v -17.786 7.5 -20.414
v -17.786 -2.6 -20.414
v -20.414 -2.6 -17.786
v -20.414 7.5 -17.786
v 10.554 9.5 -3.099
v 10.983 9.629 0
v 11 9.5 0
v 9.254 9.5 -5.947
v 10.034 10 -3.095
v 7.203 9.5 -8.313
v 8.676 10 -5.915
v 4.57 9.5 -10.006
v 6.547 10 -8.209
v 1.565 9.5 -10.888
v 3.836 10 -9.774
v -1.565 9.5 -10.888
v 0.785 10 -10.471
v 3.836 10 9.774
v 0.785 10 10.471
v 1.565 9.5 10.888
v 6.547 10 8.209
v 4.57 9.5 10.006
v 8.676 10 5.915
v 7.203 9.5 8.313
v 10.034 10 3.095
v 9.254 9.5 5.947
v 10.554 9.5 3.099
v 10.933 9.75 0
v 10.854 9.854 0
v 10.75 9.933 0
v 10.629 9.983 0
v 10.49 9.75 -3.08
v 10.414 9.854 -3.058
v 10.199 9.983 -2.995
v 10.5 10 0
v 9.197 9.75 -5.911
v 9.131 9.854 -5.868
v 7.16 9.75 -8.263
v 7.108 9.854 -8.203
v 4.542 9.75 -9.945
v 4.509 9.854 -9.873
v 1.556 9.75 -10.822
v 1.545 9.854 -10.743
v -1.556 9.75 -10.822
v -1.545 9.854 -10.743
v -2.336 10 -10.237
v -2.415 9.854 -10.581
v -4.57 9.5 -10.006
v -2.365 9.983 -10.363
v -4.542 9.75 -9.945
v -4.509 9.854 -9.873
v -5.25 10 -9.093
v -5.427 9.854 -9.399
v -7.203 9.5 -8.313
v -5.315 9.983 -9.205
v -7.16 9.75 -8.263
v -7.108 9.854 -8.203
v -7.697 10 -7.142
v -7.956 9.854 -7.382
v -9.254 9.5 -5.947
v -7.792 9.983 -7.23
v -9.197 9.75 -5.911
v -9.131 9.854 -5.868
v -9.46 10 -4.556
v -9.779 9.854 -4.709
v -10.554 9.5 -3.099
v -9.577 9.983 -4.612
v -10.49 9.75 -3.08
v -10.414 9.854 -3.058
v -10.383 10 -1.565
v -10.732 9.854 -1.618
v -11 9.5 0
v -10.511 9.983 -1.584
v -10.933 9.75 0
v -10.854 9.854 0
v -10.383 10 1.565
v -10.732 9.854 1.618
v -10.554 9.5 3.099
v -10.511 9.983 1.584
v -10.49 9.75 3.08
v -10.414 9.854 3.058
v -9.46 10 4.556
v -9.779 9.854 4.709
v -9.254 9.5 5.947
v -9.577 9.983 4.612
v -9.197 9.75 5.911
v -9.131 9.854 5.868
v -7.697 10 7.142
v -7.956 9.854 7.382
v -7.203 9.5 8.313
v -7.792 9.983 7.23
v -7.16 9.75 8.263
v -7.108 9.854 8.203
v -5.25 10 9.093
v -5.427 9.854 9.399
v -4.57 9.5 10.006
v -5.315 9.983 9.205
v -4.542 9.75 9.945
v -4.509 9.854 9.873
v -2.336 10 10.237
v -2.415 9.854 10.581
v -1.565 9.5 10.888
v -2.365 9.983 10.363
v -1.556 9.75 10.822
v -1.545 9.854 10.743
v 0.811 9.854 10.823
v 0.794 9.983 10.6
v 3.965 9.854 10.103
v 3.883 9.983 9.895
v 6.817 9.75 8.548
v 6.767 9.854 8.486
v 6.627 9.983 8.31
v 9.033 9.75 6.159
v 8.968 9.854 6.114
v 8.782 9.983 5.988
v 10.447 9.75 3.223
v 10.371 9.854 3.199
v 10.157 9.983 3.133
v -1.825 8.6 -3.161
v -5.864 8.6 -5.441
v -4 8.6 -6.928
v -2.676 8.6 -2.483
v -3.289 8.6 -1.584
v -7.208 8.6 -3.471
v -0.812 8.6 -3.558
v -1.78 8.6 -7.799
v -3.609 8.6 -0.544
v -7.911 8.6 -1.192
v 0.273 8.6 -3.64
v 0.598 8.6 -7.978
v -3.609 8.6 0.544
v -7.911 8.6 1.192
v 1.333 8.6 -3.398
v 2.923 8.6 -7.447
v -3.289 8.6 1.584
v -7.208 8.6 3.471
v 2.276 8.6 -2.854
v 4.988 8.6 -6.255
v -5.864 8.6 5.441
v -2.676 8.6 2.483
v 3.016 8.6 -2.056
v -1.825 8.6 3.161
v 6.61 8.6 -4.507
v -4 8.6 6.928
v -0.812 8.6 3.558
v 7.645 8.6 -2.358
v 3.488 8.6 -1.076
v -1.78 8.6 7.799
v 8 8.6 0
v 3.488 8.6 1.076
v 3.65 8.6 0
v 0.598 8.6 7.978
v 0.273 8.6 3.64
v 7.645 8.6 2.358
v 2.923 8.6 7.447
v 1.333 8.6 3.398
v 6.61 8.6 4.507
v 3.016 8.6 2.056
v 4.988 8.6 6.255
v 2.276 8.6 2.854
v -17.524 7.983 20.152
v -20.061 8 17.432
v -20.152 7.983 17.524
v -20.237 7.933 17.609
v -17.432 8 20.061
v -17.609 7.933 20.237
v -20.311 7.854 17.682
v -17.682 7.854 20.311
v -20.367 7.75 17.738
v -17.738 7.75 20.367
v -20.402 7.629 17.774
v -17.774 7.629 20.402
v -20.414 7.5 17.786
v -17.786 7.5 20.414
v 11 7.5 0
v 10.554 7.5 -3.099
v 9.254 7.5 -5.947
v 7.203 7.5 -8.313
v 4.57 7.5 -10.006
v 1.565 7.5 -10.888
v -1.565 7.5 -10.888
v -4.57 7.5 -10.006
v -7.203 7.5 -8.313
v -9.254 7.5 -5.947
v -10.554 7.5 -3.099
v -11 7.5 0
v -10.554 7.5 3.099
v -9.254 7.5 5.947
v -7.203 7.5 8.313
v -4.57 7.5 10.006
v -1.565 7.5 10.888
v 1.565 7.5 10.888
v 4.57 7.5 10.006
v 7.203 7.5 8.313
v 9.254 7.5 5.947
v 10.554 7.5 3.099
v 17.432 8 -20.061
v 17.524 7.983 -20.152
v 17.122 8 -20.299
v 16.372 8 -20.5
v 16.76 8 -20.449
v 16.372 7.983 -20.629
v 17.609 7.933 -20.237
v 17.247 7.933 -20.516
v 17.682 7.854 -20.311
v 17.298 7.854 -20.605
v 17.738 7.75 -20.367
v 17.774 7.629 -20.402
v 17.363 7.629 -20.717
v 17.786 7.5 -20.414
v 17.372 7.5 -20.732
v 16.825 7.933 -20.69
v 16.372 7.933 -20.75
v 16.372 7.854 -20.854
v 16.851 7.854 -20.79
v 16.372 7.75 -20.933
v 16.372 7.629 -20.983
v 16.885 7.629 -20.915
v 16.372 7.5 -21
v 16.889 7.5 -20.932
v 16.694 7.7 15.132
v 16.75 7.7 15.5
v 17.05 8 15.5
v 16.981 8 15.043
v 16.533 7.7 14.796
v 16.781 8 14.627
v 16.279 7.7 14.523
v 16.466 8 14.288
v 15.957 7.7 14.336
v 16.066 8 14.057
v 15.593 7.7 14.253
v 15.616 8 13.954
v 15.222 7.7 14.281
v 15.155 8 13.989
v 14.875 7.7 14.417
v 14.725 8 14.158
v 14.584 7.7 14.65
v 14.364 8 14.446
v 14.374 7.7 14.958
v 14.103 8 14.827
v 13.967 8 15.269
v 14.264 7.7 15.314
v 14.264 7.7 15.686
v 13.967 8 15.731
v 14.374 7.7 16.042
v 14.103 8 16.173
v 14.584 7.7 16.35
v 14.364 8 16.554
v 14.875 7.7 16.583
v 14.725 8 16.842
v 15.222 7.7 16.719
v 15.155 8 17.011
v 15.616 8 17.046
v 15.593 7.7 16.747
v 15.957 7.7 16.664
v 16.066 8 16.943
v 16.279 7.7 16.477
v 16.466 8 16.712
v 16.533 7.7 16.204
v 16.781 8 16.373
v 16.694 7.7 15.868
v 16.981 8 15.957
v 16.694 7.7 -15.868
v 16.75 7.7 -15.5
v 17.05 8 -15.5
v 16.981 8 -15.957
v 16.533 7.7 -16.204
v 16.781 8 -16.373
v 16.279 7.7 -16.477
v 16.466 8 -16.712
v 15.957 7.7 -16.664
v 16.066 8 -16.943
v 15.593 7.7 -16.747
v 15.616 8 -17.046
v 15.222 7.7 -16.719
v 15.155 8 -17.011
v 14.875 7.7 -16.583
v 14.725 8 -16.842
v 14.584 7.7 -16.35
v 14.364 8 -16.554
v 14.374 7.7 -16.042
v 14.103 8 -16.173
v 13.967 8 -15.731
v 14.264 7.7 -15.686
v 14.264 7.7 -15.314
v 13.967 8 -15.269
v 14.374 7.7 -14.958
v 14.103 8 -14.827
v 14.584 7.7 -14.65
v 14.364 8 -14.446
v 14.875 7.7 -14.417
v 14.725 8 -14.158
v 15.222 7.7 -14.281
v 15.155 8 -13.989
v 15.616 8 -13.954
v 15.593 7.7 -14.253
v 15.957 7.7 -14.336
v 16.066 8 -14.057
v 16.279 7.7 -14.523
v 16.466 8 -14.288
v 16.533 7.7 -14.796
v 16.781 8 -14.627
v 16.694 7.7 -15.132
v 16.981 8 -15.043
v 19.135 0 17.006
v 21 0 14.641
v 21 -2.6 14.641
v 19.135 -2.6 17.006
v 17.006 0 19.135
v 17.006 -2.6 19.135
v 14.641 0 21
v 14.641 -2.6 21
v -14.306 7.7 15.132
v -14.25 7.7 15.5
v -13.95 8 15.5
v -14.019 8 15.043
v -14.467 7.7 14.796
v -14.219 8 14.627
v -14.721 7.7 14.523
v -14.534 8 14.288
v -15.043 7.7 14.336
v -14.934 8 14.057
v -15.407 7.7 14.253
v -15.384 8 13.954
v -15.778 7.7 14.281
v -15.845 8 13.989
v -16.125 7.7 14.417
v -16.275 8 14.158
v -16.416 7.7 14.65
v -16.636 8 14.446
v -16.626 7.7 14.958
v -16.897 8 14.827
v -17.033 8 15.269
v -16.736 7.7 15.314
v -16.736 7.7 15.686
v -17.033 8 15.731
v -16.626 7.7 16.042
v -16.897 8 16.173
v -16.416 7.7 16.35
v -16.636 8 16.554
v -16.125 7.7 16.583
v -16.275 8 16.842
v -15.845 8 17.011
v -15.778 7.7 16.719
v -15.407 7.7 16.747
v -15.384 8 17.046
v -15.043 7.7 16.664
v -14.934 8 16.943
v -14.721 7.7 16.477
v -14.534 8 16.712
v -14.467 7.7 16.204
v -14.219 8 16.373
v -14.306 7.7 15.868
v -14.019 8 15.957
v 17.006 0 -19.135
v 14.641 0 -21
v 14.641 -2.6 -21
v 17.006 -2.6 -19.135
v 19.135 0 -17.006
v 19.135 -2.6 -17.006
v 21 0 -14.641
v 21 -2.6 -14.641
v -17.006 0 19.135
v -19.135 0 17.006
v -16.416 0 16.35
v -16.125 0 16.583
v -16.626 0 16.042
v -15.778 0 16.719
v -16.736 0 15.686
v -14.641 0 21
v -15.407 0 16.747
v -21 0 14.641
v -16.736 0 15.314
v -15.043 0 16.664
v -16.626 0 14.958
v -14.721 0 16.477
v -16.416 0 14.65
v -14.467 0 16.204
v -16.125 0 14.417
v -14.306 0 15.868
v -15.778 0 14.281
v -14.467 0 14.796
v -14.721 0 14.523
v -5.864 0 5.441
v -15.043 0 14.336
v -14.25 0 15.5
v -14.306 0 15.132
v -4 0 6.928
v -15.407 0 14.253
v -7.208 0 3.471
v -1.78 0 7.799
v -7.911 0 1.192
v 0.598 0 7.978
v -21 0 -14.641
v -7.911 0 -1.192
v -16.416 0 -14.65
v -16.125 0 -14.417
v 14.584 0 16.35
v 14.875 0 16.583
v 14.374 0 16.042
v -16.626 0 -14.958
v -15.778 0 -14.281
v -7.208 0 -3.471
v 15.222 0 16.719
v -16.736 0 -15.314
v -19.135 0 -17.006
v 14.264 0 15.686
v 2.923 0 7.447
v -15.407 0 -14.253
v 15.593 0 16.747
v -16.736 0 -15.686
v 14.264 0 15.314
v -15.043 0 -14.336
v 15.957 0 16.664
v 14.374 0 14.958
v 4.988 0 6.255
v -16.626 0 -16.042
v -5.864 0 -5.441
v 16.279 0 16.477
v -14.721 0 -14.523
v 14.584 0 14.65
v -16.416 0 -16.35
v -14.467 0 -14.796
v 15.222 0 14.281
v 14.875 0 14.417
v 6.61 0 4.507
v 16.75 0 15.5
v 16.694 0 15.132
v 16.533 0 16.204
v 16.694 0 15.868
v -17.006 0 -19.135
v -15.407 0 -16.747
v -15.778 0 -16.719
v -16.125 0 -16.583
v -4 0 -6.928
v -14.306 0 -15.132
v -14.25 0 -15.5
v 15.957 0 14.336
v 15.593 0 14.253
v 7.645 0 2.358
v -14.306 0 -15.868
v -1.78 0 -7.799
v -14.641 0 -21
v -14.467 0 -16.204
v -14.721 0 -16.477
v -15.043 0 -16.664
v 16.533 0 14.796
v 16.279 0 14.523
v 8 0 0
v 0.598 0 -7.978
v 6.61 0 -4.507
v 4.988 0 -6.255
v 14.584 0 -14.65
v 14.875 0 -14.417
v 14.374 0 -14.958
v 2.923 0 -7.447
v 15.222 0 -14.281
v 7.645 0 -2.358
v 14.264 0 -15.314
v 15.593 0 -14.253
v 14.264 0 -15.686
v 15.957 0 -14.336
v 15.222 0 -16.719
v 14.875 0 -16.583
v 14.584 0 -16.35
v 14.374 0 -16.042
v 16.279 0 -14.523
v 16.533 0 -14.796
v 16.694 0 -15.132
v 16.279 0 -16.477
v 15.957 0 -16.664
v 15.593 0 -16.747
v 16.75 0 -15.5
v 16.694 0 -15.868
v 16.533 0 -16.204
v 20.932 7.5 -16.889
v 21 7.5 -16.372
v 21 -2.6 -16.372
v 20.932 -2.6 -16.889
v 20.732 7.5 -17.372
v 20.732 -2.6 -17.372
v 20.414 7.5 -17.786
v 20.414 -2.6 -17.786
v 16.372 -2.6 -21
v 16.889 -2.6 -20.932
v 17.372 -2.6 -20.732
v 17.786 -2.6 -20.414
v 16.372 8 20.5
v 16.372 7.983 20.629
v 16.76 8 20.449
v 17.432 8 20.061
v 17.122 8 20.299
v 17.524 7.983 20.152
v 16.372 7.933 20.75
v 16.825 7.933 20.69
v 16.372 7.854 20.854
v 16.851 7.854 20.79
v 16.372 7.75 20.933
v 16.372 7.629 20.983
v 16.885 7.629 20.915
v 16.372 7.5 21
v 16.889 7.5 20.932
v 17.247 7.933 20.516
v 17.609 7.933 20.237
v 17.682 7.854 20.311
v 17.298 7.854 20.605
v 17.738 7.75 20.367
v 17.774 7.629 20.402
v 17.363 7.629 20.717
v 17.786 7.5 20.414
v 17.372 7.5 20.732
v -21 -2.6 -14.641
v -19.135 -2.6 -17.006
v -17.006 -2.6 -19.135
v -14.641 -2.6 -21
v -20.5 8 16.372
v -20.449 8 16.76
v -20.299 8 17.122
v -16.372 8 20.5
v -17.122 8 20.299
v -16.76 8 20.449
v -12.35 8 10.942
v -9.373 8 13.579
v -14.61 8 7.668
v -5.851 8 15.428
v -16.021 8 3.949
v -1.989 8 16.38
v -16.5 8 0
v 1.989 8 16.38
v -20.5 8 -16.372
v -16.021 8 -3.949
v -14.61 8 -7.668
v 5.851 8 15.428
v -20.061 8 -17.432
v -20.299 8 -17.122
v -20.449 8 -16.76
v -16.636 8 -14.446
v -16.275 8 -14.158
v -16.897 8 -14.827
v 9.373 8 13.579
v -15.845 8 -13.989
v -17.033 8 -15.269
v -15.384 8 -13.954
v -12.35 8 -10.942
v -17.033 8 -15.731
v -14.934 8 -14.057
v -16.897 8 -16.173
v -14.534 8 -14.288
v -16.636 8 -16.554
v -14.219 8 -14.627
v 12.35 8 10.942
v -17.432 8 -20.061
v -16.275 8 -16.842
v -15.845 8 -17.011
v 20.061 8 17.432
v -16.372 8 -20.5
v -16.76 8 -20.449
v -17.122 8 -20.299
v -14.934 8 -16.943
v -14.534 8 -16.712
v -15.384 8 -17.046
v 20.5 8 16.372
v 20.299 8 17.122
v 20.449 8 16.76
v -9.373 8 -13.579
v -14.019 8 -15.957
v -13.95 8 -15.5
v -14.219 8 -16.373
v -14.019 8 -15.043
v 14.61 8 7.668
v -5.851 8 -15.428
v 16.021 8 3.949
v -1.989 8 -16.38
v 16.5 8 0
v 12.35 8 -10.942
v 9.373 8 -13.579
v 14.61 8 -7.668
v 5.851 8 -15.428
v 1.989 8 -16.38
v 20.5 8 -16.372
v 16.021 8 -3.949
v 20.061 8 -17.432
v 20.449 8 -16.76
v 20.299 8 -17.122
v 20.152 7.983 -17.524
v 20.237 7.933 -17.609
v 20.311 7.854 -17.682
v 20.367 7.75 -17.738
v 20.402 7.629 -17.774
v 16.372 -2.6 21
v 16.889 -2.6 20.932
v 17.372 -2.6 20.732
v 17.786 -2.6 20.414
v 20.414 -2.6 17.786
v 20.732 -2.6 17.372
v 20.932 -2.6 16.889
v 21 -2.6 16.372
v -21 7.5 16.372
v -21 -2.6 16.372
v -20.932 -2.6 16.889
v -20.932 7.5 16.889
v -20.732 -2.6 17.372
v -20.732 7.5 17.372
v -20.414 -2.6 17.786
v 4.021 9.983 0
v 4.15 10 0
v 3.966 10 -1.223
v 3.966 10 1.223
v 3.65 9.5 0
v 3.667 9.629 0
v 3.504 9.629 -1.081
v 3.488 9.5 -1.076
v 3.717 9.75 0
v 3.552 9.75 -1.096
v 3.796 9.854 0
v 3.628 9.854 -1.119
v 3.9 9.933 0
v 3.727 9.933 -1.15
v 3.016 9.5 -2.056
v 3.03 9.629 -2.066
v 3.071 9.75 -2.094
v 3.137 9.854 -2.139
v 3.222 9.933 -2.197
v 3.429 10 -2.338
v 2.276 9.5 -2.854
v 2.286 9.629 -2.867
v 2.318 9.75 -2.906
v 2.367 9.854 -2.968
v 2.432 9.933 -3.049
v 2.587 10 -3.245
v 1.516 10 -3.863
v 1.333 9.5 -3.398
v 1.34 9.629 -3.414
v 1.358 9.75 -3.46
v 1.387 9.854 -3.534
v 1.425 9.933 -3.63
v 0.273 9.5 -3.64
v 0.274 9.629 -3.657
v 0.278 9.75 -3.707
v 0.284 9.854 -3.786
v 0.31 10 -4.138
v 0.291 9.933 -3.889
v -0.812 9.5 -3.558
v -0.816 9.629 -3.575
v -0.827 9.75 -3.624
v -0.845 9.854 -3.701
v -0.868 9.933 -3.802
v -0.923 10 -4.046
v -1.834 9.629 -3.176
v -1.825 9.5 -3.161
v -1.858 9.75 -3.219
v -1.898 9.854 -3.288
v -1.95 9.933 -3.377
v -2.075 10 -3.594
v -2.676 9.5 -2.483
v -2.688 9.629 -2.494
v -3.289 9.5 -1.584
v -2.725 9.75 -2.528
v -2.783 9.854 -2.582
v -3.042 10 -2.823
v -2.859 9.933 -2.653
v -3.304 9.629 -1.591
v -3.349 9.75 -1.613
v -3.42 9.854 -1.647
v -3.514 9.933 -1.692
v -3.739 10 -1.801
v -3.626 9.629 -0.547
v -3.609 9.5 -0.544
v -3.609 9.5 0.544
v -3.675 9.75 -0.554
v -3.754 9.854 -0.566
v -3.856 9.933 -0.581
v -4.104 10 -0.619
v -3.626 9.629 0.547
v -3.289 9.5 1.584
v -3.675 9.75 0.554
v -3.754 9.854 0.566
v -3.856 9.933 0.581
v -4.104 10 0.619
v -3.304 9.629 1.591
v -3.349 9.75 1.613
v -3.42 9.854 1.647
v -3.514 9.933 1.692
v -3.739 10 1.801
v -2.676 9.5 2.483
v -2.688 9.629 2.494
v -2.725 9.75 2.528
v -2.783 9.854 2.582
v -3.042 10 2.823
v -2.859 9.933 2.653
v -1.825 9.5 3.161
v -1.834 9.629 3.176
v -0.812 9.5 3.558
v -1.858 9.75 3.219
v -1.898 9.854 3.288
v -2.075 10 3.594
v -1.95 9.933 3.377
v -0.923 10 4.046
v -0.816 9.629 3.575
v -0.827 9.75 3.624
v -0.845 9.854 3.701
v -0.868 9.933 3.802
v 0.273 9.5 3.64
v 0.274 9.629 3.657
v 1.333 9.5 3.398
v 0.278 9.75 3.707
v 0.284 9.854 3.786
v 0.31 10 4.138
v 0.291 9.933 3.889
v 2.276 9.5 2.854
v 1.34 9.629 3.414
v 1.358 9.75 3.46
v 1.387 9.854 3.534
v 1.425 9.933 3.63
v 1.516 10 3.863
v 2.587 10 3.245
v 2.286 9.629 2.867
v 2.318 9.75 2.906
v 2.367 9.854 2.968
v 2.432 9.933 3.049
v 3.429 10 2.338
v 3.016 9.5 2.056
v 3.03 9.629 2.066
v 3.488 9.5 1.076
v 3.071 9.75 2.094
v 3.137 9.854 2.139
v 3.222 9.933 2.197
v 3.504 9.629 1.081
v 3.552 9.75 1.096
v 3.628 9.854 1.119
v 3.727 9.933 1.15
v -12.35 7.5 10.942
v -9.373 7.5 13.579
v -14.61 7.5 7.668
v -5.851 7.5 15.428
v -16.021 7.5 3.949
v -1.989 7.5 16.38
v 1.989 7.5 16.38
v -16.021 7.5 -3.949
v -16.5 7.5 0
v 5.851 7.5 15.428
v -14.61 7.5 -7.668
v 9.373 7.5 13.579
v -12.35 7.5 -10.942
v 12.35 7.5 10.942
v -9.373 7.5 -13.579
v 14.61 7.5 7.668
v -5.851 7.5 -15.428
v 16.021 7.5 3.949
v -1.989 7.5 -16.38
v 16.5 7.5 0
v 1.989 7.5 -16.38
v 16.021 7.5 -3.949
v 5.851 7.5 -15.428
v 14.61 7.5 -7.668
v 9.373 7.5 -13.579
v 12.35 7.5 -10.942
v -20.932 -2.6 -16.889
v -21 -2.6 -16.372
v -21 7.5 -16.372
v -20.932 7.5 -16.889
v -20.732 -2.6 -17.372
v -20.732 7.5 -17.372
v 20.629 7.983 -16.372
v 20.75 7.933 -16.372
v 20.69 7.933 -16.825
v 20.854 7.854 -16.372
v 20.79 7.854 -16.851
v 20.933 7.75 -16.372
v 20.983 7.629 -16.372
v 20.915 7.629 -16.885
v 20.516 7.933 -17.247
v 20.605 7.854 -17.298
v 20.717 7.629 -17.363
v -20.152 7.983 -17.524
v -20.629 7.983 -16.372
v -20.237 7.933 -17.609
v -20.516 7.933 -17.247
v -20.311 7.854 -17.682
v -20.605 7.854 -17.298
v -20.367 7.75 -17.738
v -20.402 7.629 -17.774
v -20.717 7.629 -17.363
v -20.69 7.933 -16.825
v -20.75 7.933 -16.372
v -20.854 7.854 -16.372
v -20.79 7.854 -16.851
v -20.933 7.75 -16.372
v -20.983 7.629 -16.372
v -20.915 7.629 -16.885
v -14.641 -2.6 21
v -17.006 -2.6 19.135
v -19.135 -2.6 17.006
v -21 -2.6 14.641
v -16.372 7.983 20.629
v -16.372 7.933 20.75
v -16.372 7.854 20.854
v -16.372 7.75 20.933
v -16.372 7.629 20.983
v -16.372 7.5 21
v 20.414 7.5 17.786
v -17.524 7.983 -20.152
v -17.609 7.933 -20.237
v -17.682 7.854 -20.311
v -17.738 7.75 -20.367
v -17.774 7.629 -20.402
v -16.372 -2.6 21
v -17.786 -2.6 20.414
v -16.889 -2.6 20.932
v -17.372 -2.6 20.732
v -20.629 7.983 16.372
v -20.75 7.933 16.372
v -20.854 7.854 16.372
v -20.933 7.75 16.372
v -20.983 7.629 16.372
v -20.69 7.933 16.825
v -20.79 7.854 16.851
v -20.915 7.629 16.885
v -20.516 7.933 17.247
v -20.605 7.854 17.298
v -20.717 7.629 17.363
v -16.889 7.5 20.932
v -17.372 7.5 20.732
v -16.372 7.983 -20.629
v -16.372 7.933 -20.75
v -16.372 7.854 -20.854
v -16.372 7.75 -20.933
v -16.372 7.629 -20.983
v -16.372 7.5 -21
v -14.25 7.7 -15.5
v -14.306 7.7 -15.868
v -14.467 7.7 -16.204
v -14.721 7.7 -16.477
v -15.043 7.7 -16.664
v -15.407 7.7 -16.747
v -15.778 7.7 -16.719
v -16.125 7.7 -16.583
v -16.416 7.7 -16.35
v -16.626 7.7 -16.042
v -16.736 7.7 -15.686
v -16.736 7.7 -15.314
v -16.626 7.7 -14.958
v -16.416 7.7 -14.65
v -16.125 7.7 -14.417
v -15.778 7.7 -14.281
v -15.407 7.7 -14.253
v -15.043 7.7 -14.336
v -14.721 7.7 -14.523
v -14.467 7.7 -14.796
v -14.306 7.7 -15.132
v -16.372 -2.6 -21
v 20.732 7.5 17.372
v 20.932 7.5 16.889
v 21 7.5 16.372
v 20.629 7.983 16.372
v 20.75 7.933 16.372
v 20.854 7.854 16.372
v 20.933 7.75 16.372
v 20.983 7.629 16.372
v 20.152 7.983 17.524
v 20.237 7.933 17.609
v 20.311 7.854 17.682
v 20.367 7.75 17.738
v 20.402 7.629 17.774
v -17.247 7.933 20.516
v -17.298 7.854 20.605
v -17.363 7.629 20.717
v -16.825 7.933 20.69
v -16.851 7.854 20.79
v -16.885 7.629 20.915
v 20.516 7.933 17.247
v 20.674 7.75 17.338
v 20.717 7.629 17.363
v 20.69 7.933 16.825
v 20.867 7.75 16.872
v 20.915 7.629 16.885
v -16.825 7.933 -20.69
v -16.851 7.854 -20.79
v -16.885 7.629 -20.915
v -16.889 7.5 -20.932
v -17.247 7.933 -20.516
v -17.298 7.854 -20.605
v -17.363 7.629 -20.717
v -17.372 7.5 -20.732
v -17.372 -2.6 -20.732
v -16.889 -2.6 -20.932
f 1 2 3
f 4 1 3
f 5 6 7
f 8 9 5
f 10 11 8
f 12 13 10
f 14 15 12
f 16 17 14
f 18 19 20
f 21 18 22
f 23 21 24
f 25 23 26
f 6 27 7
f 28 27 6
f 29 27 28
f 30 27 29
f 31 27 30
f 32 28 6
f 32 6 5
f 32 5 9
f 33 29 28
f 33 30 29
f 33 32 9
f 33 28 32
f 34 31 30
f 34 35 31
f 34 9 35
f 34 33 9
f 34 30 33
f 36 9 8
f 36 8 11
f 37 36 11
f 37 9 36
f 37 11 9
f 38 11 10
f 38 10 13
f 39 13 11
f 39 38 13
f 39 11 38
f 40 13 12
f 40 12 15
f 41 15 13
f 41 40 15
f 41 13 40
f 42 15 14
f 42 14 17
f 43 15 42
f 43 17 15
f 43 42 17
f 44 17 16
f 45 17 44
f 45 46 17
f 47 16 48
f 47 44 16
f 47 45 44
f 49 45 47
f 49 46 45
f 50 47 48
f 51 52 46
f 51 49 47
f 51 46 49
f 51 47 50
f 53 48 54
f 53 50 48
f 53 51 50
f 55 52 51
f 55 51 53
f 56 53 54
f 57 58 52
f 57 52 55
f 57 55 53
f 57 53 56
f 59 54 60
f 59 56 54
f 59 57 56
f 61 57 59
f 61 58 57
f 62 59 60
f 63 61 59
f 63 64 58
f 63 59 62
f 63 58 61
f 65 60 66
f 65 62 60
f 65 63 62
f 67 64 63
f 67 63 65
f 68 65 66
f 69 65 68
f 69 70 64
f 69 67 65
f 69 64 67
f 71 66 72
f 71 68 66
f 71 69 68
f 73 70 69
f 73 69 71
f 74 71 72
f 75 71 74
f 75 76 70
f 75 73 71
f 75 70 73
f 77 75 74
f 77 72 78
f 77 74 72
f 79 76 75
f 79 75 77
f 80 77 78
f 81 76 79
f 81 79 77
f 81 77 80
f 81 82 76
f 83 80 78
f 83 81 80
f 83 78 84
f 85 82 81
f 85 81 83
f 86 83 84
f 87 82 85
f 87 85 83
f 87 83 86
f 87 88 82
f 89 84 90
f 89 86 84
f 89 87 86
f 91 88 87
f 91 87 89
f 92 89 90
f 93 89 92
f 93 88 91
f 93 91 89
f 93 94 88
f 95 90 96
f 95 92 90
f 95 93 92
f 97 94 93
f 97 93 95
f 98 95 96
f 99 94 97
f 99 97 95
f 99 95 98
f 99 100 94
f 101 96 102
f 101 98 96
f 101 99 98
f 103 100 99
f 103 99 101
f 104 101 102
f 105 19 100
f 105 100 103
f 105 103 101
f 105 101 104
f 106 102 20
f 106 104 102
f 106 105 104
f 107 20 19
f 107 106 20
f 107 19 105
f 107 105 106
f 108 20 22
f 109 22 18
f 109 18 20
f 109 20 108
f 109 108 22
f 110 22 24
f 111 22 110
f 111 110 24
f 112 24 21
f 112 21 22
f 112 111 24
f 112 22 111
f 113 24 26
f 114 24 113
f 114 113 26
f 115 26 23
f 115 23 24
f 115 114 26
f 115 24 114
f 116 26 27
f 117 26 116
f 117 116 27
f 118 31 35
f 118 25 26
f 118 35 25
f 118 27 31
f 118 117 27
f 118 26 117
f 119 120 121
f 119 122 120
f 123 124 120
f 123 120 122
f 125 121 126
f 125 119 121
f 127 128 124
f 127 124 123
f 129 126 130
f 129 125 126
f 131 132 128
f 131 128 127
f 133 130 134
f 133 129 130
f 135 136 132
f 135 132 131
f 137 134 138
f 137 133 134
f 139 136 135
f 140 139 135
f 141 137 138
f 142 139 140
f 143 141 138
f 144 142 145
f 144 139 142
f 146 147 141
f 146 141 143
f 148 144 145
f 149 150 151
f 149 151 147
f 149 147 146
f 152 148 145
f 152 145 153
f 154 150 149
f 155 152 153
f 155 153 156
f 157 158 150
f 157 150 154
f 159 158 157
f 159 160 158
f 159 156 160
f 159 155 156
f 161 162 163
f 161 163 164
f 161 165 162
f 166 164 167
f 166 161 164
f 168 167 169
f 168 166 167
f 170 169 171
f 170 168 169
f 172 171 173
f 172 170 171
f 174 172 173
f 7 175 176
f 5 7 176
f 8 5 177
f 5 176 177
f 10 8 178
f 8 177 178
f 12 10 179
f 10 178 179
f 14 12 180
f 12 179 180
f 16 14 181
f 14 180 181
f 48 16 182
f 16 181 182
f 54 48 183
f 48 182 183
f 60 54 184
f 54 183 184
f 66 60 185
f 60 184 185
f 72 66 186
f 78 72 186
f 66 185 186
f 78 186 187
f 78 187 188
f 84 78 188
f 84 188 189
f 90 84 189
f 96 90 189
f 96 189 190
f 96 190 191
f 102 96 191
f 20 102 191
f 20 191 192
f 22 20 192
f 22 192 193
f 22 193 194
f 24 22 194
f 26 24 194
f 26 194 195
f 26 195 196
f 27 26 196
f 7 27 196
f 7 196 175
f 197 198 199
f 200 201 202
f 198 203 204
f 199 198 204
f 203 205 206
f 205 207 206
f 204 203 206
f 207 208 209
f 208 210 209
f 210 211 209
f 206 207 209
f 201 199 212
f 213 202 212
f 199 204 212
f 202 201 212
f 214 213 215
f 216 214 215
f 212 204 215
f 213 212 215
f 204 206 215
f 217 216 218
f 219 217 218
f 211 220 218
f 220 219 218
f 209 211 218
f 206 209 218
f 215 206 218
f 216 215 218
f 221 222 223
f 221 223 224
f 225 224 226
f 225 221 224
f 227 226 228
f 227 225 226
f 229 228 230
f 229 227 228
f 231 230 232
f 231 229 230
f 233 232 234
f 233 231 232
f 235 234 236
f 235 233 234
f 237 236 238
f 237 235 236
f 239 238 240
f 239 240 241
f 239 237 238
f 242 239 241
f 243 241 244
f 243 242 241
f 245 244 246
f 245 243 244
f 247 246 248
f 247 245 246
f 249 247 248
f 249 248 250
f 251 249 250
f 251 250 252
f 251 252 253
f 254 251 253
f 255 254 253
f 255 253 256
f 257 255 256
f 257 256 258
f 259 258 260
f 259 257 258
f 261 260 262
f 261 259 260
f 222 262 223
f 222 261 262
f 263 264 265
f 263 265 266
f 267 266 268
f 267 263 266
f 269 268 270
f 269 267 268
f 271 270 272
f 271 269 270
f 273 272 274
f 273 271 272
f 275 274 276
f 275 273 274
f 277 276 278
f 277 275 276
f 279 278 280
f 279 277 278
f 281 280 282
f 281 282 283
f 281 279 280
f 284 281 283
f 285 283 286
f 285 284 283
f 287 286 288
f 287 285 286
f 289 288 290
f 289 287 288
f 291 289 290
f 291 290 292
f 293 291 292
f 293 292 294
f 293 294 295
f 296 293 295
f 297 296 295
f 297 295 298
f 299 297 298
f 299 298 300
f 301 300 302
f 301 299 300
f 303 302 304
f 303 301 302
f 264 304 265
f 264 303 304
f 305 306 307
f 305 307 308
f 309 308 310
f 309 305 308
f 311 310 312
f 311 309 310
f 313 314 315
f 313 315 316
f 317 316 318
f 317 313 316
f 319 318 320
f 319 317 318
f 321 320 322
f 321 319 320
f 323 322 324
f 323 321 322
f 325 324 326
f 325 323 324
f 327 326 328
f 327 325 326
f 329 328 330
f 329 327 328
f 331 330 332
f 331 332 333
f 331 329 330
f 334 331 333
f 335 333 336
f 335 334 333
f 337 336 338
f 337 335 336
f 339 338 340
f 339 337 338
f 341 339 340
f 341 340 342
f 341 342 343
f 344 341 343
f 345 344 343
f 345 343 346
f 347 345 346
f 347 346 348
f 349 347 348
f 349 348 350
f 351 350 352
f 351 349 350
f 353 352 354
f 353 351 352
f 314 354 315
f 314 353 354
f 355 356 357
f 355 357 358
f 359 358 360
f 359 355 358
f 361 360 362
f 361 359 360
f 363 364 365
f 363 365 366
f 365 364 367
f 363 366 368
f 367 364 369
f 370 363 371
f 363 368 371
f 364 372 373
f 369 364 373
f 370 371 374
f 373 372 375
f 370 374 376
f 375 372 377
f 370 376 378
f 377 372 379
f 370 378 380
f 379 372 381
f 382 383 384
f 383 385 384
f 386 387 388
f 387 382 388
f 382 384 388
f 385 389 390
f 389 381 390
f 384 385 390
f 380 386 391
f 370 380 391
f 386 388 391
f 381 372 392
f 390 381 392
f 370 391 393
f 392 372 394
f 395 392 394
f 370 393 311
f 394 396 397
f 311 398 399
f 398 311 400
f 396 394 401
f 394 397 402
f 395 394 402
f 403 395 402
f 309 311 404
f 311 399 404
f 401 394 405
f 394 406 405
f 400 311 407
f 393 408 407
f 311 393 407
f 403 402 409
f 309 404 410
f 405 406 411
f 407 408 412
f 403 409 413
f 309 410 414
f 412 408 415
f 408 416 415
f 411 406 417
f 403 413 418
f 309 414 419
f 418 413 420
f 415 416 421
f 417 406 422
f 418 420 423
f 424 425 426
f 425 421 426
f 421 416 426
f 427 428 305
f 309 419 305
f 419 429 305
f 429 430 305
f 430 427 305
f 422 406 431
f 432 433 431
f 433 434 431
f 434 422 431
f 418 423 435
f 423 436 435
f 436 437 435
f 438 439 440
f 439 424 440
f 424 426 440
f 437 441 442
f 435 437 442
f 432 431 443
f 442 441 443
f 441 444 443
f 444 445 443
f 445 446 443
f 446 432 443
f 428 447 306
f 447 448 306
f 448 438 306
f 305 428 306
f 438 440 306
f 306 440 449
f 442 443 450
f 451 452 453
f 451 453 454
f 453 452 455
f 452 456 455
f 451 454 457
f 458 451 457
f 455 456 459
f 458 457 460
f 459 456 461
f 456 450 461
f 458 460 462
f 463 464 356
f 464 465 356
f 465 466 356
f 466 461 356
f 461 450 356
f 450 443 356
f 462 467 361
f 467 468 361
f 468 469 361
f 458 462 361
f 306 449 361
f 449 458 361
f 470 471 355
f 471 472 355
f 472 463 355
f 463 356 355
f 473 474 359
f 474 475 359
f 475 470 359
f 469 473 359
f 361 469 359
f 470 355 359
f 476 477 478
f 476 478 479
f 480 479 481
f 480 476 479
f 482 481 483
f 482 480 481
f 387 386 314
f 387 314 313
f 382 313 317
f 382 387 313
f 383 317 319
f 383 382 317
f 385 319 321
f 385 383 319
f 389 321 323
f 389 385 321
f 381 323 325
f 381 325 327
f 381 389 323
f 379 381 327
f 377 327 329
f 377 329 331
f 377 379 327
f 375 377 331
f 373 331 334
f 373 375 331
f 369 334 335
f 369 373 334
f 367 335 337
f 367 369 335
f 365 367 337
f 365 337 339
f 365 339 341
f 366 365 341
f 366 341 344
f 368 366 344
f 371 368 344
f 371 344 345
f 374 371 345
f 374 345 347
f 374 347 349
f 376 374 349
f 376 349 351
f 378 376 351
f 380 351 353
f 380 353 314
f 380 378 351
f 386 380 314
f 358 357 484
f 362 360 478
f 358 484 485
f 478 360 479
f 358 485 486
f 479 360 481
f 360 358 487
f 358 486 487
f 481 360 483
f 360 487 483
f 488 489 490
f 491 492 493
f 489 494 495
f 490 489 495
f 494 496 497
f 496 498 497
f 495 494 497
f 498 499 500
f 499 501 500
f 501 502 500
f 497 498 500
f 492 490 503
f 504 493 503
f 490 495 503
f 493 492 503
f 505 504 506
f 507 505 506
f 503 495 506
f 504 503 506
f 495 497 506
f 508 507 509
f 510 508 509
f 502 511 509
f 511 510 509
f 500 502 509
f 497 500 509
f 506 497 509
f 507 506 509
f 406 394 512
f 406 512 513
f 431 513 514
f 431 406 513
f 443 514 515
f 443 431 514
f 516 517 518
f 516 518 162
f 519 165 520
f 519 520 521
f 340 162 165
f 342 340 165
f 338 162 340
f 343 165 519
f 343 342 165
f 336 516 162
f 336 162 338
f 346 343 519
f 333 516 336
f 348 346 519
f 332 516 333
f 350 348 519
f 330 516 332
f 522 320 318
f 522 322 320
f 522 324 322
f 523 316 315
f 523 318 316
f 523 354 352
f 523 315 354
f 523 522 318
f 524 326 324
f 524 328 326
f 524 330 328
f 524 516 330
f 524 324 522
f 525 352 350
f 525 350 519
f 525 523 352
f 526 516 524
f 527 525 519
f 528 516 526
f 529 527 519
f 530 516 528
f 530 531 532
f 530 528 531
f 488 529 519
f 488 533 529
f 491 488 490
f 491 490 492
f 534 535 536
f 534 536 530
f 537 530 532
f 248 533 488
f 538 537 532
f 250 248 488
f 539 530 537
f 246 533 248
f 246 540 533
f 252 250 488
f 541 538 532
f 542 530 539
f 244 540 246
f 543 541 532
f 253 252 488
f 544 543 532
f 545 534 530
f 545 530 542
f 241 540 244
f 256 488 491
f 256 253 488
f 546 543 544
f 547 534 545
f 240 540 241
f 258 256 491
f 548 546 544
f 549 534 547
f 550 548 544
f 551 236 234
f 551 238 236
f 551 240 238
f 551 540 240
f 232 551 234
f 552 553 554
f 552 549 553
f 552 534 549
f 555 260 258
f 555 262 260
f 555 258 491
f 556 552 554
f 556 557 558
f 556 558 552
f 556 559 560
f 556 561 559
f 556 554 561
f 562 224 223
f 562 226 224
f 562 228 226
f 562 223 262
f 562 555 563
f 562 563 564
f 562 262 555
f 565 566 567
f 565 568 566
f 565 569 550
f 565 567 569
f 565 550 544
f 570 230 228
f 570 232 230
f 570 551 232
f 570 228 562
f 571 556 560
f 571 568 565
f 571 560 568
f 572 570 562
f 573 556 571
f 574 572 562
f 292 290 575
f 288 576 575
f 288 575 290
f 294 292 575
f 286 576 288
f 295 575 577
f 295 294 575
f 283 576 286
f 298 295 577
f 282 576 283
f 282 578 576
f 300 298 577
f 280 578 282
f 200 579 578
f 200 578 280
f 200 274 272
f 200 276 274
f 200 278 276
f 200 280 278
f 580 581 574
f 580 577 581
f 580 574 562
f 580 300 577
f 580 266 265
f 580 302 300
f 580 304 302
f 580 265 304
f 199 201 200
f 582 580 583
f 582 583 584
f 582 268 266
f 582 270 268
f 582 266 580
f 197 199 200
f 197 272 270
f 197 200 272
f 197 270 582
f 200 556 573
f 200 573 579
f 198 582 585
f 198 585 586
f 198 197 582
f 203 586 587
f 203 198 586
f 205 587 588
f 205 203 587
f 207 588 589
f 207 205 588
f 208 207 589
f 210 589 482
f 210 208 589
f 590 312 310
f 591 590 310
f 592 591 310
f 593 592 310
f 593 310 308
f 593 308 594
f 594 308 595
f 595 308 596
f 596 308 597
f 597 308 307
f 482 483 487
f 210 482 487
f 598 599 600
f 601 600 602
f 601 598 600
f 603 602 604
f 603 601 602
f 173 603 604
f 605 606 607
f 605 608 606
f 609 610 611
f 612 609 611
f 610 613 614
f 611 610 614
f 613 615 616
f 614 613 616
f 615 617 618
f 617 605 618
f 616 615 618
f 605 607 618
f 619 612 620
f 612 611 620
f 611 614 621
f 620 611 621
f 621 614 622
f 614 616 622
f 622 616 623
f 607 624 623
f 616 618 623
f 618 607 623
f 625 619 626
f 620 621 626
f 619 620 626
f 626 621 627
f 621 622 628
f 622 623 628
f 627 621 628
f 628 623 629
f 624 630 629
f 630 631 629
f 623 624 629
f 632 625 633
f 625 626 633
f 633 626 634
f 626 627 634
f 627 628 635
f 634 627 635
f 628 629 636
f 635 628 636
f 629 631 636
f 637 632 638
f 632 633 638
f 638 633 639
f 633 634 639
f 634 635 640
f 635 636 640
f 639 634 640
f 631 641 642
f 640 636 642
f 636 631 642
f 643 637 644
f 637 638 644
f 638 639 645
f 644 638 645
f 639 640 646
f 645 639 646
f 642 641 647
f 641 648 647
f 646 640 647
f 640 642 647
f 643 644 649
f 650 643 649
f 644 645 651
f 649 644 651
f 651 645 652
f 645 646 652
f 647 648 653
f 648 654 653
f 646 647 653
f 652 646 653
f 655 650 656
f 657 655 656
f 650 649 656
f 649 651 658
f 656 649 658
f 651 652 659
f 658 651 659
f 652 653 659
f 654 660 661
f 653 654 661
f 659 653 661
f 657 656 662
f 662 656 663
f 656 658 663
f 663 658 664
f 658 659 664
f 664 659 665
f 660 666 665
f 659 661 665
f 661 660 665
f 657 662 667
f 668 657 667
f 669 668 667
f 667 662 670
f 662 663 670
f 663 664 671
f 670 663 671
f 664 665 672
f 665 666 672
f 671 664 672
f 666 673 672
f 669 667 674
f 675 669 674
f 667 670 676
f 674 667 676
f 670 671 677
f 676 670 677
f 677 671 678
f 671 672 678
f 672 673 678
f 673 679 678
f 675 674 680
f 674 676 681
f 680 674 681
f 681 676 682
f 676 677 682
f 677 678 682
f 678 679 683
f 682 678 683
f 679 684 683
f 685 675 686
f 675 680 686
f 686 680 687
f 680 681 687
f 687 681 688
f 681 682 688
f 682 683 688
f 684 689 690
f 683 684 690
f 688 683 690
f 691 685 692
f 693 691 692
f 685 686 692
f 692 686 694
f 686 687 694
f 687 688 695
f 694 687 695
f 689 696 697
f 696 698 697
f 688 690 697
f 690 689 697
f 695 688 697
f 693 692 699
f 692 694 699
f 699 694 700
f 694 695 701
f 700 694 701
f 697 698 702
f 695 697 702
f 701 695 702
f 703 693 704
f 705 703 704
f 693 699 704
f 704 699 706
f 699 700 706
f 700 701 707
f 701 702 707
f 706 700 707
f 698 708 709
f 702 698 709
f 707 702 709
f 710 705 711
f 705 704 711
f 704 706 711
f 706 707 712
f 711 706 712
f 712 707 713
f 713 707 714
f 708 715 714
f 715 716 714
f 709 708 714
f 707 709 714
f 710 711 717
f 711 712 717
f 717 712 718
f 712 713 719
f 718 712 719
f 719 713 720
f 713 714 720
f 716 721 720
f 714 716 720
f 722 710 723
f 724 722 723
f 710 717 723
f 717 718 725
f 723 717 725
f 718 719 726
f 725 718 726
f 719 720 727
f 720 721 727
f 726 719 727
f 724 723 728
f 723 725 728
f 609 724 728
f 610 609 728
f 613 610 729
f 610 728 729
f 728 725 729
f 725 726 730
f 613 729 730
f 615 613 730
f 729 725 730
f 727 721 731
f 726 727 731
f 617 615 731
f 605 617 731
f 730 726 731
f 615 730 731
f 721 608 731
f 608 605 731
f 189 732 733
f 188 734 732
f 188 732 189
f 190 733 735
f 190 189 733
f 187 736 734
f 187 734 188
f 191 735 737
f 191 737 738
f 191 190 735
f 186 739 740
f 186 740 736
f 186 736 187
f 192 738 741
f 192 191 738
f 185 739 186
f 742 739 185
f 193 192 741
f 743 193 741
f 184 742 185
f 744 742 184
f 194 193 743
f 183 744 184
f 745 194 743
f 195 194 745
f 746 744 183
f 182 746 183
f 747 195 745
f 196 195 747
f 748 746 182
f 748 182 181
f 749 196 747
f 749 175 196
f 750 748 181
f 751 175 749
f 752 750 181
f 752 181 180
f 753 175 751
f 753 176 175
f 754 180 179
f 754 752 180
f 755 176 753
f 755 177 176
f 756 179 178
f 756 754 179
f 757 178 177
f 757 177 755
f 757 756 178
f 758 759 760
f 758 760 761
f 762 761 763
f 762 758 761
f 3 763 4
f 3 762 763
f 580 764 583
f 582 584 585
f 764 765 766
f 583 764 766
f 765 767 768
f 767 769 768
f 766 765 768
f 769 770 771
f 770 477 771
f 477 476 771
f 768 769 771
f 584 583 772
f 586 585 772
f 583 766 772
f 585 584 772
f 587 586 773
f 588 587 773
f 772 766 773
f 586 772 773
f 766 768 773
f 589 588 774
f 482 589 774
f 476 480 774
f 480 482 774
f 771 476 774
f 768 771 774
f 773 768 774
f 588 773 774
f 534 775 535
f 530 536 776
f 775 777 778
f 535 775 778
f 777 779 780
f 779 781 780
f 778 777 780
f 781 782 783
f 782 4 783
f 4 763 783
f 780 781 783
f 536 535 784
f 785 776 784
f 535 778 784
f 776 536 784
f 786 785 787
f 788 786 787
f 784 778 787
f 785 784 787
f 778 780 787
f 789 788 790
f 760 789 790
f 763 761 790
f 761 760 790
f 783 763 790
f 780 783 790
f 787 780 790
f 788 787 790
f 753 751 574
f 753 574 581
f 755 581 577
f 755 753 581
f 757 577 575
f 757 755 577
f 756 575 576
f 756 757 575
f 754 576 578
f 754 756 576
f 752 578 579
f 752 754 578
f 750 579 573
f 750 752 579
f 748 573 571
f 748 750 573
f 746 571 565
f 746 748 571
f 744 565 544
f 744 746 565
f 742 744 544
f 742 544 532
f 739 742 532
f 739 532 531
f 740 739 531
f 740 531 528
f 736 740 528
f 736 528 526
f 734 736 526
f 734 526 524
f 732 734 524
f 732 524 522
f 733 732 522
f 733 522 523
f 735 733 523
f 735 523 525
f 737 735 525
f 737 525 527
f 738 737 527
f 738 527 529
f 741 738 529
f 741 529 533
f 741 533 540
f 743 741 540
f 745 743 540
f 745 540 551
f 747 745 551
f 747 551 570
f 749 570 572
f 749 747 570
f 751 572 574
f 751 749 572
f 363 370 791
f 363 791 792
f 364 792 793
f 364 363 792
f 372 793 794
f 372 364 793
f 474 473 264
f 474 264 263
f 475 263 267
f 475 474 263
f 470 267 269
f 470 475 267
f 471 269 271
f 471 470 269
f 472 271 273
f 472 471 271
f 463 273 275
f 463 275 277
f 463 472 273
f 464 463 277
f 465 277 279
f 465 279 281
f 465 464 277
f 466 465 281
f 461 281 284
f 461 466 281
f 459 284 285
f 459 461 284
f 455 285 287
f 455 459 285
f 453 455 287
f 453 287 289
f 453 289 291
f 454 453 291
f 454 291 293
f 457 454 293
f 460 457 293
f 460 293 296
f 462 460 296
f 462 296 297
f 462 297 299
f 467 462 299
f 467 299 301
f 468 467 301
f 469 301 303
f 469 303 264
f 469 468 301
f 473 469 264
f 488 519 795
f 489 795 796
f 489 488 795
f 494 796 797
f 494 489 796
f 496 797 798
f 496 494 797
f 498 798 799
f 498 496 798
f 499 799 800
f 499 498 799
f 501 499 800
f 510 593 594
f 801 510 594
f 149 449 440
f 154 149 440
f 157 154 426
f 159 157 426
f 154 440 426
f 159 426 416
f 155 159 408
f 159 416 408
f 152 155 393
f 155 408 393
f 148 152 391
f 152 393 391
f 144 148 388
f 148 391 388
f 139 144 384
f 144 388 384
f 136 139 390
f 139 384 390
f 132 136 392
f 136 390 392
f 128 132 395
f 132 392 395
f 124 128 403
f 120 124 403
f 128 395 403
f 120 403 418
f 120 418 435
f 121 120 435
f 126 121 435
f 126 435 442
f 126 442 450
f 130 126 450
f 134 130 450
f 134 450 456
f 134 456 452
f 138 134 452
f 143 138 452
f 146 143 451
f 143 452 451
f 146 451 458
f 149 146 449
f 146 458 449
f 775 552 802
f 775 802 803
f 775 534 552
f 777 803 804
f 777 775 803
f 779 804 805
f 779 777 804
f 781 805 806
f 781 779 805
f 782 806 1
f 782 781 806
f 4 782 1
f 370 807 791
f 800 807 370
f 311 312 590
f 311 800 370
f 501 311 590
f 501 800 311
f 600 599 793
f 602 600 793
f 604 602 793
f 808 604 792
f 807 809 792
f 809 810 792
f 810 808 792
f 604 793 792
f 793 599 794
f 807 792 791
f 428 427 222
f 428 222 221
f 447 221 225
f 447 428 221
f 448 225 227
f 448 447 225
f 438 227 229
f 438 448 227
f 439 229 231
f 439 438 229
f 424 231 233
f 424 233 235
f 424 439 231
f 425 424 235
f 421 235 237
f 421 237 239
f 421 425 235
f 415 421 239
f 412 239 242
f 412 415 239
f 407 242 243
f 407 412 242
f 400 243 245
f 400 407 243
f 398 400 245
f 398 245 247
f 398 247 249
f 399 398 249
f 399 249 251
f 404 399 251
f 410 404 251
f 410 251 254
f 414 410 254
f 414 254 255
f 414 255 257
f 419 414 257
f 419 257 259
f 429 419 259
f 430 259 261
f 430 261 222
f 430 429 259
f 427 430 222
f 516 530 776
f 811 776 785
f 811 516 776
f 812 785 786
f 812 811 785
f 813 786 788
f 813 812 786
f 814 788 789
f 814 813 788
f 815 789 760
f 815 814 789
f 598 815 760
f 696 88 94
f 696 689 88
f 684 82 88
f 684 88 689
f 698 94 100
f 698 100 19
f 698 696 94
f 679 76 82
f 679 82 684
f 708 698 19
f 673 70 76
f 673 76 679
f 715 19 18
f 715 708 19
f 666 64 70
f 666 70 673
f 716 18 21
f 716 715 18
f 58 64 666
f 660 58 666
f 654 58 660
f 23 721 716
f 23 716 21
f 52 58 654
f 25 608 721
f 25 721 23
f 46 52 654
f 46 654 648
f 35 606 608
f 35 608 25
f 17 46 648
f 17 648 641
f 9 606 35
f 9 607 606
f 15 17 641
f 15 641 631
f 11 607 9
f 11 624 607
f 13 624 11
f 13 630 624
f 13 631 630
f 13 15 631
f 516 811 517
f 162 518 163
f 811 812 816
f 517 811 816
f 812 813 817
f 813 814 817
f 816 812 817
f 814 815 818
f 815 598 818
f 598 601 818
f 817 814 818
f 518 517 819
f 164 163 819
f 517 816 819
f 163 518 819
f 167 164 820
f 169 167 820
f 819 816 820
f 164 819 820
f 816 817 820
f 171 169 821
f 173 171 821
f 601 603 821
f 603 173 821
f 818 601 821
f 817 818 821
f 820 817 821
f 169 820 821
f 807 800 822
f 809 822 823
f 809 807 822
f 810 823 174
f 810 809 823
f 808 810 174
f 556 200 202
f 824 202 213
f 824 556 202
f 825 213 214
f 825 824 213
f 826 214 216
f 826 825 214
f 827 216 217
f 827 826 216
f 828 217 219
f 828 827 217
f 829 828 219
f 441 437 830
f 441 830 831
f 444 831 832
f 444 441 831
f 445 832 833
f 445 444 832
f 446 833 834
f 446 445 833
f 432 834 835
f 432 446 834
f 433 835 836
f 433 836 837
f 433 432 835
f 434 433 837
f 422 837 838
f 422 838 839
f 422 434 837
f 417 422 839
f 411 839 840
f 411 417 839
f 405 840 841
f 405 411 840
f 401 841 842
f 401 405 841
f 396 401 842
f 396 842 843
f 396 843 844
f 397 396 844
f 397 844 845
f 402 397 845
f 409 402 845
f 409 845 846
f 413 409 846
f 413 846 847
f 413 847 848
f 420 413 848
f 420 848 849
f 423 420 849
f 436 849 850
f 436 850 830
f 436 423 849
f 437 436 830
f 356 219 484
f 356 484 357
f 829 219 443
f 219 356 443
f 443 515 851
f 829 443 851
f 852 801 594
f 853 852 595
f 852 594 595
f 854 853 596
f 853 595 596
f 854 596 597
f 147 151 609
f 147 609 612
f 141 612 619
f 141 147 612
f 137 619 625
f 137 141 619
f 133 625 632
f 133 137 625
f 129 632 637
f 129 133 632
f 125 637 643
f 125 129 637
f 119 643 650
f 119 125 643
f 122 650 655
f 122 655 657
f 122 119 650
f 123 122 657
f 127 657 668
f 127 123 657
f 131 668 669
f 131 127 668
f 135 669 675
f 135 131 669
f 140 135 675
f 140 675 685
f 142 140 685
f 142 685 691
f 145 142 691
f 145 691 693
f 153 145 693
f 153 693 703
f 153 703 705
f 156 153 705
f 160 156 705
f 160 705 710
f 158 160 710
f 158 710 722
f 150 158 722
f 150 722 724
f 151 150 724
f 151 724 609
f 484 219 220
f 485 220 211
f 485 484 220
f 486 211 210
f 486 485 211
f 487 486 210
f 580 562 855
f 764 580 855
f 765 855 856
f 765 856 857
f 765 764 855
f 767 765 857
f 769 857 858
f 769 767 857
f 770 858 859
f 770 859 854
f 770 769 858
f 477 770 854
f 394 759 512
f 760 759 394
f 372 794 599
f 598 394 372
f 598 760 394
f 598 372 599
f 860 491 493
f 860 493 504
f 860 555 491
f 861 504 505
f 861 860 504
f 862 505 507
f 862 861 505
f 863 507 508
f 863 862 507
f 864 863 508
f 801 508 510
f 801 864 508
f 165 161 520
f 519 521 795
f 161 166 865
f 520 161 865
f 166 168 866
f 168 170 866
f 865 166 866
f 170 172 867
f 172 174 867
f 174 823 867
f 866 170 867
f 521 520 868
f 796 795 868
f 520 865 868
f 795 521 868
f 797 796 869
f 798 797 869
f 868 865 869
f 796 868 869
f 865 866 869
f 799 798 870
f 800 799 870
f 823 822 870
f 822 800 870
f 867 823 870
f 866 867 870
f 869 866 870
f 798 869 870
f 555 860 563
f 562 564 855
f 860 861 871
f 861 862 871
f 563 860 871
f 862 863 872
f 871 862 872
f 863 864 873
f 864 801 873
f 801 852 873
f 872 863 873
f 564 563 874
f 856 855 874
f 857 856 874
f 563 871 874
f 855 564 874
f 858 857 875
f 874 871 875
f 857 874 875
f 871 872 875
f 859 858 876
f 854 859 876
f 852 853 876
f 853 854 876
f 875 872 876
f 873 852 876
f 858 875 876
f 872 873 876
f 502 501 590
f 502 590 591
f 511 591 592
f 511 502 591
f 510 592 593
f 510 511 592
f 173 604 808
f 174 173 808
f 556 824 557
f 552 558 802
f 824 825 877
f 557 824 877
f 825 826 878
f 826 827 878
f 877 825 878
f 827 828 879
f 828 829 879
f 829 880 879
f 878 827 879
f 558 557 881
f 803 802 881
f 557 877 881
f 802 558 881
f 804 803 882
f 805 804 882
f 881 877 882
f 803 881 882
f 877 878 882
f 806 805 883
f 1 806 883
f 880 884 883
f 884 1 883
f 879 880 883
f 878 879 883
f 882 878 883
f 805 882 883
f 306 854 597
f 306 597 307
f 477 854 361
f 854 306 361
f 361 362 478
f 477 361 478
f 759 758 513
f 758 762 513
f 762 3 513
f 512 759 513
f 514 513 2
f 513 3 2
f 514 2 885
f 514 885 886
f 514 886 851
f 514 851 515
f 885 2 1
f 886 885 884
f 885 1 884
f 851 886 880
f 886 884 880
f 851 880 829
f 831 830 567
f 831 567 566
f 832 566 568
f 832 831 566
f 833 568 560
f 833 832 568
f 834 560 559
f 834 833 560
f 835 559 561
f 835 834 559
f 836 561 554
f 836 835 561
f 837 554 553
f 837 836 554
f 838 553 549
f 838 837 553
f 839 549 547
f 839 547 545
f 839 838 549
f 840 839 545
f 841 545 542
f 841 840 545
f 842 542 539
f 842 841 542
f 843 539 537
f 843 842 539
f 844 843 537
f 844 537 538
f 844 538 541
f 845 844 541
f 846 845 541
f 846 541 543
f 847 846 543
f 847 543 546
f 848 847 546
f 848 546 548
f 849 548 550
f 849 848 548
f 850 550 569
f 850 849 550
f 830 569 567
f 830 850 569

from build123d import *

# Parameters (mm, degrees)
SKETCH_1_R          = 2.65
SKETCH_1_R_2        = 16.5
SKETCH_1_R_3        = 1.25
EXTRUDE_1_DEPTH     = 8
SKETCH_1_3_R        = 16.5
SKETCH_1_3_R_2      = 11
EXTRUDE_2_DEPTH     = 7.5
SKETCH_1_4_R        = 11
SKETCH_1_4_R_2      = 3.65
EXTRUDE_3_DEPTH     = 10
EXTRUDE_4_DEPTH     = 2.6
SKETCH_2_R          = 8
CUT_EXTRUDE_1_DEPTH = 8.6
FILLET_1_R          = 2
FILLET_2_R          = 0.5
CHAMFER_1_SIZE      = 0.3


with BuildPart() as part:
    # Sketch 1 → Extrude 1 (new body)
    with BuildSketch(Plane(origin=(0, 0, 0), x_dir=(1, 0, 0), z_dir=(0, 1, 0))):
        with BuildLine():
            ThreePointArc((-14.641038215, 21), (-18.101933598, 18.101933598), (-21, 14.641038215))
            Line((-21, 14.641038215), (-21, -14.641038215))
            ThreePointArc((-21, -14.641038215), (-18.101933598, -18.101933598), (-14.641038215, -21))
            Line((-14.641038215, -21), (14.641038215, -21))
            ThreePointArc((14.641038215, -21), (18.101933598, -18.101933598), (21, -14.641038215))
            Line((21, -14.641038215), (21, 14.641038215))
            ThreePointArc((21, 14.641038215), (18.101933598, 18.101933598), (14.641038215, 21))
            Line((14.641038215, 21), (-14.641038215, 21))
        make_face()
        with Locations((-15.5, -15.5)):
            Circle(SKETCH_1_R, mode=Mode.SUBTRACT)
        with Locations((15.5, -15.5)):
            Circle(SKETCH_1_R, mode=Mode.SUBTRACT)
        Circle(SKETCH_1_R_2, mode=Mode.SUBTRACT)
        with Locations((-15.5, 15.5)):
            Circle(SKETCH_1_R, mode=Mode.SUBTRACT)
        with Locations((15.5, 15.5)):
            Circle(SKETCH_1_R, mode=Mode.SUBTRACT)
        with Locations((15.5, -15.5)):
            Circle(SKETCH_1_R)
        with Locations((15.5, -15.5)):
            Circle(SKETCH_1_R_3, mode=Mode.SUBTRACT)
        with Locations((-15.5, -15.5)):
            Circle(SKETCH_1_R)
        with Locations((-15.5, -15.5)):
            Circle(SKETCH_1_R_3, mode=Mode.SUBTRACT)
        with Locations((-15.5, 15.5)):
            Circle(SKETCH_1_R)
        with Locations((-15.5, 15.5)):
            Circle(SKETCH_1_R_3, mode=Mode.SUBTRACT)
        with Locations((15.5, 15.5)):
            Circle(SKETCH_1_R)
        with Locations((15.5, 15.5)):
            Circle(SKETCH_1_R_3, mode=Mode.SUBTRACT)
        with BuildLine():
            ThreePointArc((-14.641038215, -21), (-18.101933598, -18.101933598), (-21, -14.641038215))
            Line((-21, -14.641038215), (-21, -17.2))
            Line((-21, -17.2), (-17.2, -21))
            Line((-17.2, -21), (-14.641038215, -21))
        make_face()
        with BuildLine():
            Line((-17.2, 21), (-21, 17.2))
            Line((-21, 17.2), (-21, 14.641038215))
            ThreePointArc((-21, 14.641038215), (-18.101933598, 18.101933598), (-14.641038215, 21))
            Line((-14.641038215, 21), (-17.2, 21))
        make_face()
        with BuildLine():
            Line((17.2, 21), (14.641038215, 21))
            ThreePointArc((14.641038215, 21), (18.101933598, 18.101933598), (21, 14.641038215))
            Line((21, 14.641038215), (21, 17.2))
            Line((21, 17.2), (17.2, 21))
        make_face()
        with BuildLine():
            ThreePointArc((21, -14.641038215), (18.101933598, -18.101933598), (14.641038215, -21))
            Line((14.641038215, -21), (17.2, -21))
            Line((17.2, -21), (21, -17.2))
            Line((21, -17.2), (21, -14.641038215))
        make_face()
    extrude(amount=EXTRUDE_1_DEPTH)

    # Sketch 1_3 → Extrude 2 (add)
    with BuildSketch(Plane(origin=(0, 0, 0), x_dir=(1, 0, 0), z_dir=(0, 1, 0))):
        Circle(SKETCH_1_3_R)
        Circle(SKETCH_1_3_R_2, mode=Mode.SUBTRACT)
    extrude(amount=EXTRUDE_2_DEPTH)

    # Sketch 1_4 → Extrude 3 (add)
    with BuildSketch(Plane(origin=(0, 0, 0), x_dir=(1, 0, 0), z_dir=(0, 1, 0))):
        Circle(SKETCH_1_4_R)
        Circle(SKETCH_1_4_R_2, mode=Mode.SUBTRACT)
    extrude(amount=EXTRUDE_3_DEPTH)

    # Sketch 1_5 → Extrude 4 (add)
    with BuildSketch(Plane(origin=(0, 0, 0), x_dir=(1, 0, 0), z_dir=(0, 1, 0))):
        with BuildLine():
            ThreePointArc((-14.641038215, -21), (-18.101933598, -18.101933598), (-21, -14.641038215))
            Line((-21, -14.641038215), (-21, -17.2))
            Line((-21, -17.2), (-17.2, -21))
            Line((-17.2, -21), (-14.641038215, -21))
        make_face()
        with BuildLine():
            ThreePointArc((21, -14.641038215), (18.101933598, -18.101933598), (14.641038215, -21))
            Line((14.641038215, -21), (17.2, -21))
            Line((17.2, -21), (21, -17.2))
            Line((21, -17.2), (21, -14.641038215))
        make_face()
        with BuildLine():
            Line((-17.2, 21), (-21, 17.2))
            Line((-21, 17.2), (-21, 14.641038215))
            ThreePointArc((-21, 14.641038215), (-18.101933598, 18.101933598), (-14.641038215, 21))
            Line((-14.641038215, 21), (-17.2, 21))
        make_face()
        with BuildLine():
            Line((17.2, 21), (14.641038215, 21))
            ThreePointArc((14.641038215, 21), (18.101933598, 18.101933598), (21, 14.641038215))
            Line((21, 14.641038215), (21, 17.2))
            Line((21, 17.2), (17.2, 21))
        make_face()
    extrude(amount=-EXTRUDE_4_DEPTH)

    # Sketch 2 → Cut-Extrude 1 (cut)
    with BuildSketch(Plane.XZ):
        Circle(SKETCH_2_R)
    extrude(amount=-CUT_EXTRUDE_1_DEPTH, mode=Mode.SUBTRACT)

    # Fillet 1
    fillet_1_edges = [part.edges().sort_by_distance(p)[0] for p in [
        (-17.2, 2.7, 21),
        (-21, 2.7, 17.2),
        (-21, 2.7, -17.2),
        (-17.2, 2.7, -21),
        (17.2, 2.7, -21),
        (21, 2.7, -17.2),
        (21, 2.7, 17.2),
        (17.2, 2.7, 21),
    ]]
    fillet(fillet_1_edges, radius=FILLET_1_R)

    # Fillet 2
    fillet_2_edges = [part.edges().sort_by_distance(p)[0] for p in [
        (21, 8, 0),
        (19.1, 8, 19.1),
        (0, 8, 21),
        (19.1, 8, -19.1),
        (0, 8, -21),
        (-19.1, 8, -19.1),
        (-21, 8, 0),
        (-19.1, 8, 19.1),
        (20.847759065, 8, -17.13693974),
        (17.13693974, 8, -20.847759065),
        (-17.13693974, 8, -20.847759065),
        (-20.847759065, 8, -17.13693974),
        (-20.847759065, 8, 17.13693974),
        (-17.13693974, 8, 20.847759065),
        (17.13693974, 8, 20.847759065),
        (20.847759065, 8, 17.13693974),
        (-3.65, 10, 0),
        (-11, 10, 0),
    ]]
    fillet(fillet_2_edges, radius=FILLET_2_R)

    # Chamfer 1
    chamfer_1_edges = [part.edges().sort_by_distance(p)[0] for p in [
        (-16.75, 8, -15.5),
        (14.25, 8, -15.5),
        (14.25, 8, 15.5),
        (-16.75, 8, 15.5),
    ]]
    chamfer(chamfer_1_edges, length=CHAMFER_1_SIZE)


solid = part.part
